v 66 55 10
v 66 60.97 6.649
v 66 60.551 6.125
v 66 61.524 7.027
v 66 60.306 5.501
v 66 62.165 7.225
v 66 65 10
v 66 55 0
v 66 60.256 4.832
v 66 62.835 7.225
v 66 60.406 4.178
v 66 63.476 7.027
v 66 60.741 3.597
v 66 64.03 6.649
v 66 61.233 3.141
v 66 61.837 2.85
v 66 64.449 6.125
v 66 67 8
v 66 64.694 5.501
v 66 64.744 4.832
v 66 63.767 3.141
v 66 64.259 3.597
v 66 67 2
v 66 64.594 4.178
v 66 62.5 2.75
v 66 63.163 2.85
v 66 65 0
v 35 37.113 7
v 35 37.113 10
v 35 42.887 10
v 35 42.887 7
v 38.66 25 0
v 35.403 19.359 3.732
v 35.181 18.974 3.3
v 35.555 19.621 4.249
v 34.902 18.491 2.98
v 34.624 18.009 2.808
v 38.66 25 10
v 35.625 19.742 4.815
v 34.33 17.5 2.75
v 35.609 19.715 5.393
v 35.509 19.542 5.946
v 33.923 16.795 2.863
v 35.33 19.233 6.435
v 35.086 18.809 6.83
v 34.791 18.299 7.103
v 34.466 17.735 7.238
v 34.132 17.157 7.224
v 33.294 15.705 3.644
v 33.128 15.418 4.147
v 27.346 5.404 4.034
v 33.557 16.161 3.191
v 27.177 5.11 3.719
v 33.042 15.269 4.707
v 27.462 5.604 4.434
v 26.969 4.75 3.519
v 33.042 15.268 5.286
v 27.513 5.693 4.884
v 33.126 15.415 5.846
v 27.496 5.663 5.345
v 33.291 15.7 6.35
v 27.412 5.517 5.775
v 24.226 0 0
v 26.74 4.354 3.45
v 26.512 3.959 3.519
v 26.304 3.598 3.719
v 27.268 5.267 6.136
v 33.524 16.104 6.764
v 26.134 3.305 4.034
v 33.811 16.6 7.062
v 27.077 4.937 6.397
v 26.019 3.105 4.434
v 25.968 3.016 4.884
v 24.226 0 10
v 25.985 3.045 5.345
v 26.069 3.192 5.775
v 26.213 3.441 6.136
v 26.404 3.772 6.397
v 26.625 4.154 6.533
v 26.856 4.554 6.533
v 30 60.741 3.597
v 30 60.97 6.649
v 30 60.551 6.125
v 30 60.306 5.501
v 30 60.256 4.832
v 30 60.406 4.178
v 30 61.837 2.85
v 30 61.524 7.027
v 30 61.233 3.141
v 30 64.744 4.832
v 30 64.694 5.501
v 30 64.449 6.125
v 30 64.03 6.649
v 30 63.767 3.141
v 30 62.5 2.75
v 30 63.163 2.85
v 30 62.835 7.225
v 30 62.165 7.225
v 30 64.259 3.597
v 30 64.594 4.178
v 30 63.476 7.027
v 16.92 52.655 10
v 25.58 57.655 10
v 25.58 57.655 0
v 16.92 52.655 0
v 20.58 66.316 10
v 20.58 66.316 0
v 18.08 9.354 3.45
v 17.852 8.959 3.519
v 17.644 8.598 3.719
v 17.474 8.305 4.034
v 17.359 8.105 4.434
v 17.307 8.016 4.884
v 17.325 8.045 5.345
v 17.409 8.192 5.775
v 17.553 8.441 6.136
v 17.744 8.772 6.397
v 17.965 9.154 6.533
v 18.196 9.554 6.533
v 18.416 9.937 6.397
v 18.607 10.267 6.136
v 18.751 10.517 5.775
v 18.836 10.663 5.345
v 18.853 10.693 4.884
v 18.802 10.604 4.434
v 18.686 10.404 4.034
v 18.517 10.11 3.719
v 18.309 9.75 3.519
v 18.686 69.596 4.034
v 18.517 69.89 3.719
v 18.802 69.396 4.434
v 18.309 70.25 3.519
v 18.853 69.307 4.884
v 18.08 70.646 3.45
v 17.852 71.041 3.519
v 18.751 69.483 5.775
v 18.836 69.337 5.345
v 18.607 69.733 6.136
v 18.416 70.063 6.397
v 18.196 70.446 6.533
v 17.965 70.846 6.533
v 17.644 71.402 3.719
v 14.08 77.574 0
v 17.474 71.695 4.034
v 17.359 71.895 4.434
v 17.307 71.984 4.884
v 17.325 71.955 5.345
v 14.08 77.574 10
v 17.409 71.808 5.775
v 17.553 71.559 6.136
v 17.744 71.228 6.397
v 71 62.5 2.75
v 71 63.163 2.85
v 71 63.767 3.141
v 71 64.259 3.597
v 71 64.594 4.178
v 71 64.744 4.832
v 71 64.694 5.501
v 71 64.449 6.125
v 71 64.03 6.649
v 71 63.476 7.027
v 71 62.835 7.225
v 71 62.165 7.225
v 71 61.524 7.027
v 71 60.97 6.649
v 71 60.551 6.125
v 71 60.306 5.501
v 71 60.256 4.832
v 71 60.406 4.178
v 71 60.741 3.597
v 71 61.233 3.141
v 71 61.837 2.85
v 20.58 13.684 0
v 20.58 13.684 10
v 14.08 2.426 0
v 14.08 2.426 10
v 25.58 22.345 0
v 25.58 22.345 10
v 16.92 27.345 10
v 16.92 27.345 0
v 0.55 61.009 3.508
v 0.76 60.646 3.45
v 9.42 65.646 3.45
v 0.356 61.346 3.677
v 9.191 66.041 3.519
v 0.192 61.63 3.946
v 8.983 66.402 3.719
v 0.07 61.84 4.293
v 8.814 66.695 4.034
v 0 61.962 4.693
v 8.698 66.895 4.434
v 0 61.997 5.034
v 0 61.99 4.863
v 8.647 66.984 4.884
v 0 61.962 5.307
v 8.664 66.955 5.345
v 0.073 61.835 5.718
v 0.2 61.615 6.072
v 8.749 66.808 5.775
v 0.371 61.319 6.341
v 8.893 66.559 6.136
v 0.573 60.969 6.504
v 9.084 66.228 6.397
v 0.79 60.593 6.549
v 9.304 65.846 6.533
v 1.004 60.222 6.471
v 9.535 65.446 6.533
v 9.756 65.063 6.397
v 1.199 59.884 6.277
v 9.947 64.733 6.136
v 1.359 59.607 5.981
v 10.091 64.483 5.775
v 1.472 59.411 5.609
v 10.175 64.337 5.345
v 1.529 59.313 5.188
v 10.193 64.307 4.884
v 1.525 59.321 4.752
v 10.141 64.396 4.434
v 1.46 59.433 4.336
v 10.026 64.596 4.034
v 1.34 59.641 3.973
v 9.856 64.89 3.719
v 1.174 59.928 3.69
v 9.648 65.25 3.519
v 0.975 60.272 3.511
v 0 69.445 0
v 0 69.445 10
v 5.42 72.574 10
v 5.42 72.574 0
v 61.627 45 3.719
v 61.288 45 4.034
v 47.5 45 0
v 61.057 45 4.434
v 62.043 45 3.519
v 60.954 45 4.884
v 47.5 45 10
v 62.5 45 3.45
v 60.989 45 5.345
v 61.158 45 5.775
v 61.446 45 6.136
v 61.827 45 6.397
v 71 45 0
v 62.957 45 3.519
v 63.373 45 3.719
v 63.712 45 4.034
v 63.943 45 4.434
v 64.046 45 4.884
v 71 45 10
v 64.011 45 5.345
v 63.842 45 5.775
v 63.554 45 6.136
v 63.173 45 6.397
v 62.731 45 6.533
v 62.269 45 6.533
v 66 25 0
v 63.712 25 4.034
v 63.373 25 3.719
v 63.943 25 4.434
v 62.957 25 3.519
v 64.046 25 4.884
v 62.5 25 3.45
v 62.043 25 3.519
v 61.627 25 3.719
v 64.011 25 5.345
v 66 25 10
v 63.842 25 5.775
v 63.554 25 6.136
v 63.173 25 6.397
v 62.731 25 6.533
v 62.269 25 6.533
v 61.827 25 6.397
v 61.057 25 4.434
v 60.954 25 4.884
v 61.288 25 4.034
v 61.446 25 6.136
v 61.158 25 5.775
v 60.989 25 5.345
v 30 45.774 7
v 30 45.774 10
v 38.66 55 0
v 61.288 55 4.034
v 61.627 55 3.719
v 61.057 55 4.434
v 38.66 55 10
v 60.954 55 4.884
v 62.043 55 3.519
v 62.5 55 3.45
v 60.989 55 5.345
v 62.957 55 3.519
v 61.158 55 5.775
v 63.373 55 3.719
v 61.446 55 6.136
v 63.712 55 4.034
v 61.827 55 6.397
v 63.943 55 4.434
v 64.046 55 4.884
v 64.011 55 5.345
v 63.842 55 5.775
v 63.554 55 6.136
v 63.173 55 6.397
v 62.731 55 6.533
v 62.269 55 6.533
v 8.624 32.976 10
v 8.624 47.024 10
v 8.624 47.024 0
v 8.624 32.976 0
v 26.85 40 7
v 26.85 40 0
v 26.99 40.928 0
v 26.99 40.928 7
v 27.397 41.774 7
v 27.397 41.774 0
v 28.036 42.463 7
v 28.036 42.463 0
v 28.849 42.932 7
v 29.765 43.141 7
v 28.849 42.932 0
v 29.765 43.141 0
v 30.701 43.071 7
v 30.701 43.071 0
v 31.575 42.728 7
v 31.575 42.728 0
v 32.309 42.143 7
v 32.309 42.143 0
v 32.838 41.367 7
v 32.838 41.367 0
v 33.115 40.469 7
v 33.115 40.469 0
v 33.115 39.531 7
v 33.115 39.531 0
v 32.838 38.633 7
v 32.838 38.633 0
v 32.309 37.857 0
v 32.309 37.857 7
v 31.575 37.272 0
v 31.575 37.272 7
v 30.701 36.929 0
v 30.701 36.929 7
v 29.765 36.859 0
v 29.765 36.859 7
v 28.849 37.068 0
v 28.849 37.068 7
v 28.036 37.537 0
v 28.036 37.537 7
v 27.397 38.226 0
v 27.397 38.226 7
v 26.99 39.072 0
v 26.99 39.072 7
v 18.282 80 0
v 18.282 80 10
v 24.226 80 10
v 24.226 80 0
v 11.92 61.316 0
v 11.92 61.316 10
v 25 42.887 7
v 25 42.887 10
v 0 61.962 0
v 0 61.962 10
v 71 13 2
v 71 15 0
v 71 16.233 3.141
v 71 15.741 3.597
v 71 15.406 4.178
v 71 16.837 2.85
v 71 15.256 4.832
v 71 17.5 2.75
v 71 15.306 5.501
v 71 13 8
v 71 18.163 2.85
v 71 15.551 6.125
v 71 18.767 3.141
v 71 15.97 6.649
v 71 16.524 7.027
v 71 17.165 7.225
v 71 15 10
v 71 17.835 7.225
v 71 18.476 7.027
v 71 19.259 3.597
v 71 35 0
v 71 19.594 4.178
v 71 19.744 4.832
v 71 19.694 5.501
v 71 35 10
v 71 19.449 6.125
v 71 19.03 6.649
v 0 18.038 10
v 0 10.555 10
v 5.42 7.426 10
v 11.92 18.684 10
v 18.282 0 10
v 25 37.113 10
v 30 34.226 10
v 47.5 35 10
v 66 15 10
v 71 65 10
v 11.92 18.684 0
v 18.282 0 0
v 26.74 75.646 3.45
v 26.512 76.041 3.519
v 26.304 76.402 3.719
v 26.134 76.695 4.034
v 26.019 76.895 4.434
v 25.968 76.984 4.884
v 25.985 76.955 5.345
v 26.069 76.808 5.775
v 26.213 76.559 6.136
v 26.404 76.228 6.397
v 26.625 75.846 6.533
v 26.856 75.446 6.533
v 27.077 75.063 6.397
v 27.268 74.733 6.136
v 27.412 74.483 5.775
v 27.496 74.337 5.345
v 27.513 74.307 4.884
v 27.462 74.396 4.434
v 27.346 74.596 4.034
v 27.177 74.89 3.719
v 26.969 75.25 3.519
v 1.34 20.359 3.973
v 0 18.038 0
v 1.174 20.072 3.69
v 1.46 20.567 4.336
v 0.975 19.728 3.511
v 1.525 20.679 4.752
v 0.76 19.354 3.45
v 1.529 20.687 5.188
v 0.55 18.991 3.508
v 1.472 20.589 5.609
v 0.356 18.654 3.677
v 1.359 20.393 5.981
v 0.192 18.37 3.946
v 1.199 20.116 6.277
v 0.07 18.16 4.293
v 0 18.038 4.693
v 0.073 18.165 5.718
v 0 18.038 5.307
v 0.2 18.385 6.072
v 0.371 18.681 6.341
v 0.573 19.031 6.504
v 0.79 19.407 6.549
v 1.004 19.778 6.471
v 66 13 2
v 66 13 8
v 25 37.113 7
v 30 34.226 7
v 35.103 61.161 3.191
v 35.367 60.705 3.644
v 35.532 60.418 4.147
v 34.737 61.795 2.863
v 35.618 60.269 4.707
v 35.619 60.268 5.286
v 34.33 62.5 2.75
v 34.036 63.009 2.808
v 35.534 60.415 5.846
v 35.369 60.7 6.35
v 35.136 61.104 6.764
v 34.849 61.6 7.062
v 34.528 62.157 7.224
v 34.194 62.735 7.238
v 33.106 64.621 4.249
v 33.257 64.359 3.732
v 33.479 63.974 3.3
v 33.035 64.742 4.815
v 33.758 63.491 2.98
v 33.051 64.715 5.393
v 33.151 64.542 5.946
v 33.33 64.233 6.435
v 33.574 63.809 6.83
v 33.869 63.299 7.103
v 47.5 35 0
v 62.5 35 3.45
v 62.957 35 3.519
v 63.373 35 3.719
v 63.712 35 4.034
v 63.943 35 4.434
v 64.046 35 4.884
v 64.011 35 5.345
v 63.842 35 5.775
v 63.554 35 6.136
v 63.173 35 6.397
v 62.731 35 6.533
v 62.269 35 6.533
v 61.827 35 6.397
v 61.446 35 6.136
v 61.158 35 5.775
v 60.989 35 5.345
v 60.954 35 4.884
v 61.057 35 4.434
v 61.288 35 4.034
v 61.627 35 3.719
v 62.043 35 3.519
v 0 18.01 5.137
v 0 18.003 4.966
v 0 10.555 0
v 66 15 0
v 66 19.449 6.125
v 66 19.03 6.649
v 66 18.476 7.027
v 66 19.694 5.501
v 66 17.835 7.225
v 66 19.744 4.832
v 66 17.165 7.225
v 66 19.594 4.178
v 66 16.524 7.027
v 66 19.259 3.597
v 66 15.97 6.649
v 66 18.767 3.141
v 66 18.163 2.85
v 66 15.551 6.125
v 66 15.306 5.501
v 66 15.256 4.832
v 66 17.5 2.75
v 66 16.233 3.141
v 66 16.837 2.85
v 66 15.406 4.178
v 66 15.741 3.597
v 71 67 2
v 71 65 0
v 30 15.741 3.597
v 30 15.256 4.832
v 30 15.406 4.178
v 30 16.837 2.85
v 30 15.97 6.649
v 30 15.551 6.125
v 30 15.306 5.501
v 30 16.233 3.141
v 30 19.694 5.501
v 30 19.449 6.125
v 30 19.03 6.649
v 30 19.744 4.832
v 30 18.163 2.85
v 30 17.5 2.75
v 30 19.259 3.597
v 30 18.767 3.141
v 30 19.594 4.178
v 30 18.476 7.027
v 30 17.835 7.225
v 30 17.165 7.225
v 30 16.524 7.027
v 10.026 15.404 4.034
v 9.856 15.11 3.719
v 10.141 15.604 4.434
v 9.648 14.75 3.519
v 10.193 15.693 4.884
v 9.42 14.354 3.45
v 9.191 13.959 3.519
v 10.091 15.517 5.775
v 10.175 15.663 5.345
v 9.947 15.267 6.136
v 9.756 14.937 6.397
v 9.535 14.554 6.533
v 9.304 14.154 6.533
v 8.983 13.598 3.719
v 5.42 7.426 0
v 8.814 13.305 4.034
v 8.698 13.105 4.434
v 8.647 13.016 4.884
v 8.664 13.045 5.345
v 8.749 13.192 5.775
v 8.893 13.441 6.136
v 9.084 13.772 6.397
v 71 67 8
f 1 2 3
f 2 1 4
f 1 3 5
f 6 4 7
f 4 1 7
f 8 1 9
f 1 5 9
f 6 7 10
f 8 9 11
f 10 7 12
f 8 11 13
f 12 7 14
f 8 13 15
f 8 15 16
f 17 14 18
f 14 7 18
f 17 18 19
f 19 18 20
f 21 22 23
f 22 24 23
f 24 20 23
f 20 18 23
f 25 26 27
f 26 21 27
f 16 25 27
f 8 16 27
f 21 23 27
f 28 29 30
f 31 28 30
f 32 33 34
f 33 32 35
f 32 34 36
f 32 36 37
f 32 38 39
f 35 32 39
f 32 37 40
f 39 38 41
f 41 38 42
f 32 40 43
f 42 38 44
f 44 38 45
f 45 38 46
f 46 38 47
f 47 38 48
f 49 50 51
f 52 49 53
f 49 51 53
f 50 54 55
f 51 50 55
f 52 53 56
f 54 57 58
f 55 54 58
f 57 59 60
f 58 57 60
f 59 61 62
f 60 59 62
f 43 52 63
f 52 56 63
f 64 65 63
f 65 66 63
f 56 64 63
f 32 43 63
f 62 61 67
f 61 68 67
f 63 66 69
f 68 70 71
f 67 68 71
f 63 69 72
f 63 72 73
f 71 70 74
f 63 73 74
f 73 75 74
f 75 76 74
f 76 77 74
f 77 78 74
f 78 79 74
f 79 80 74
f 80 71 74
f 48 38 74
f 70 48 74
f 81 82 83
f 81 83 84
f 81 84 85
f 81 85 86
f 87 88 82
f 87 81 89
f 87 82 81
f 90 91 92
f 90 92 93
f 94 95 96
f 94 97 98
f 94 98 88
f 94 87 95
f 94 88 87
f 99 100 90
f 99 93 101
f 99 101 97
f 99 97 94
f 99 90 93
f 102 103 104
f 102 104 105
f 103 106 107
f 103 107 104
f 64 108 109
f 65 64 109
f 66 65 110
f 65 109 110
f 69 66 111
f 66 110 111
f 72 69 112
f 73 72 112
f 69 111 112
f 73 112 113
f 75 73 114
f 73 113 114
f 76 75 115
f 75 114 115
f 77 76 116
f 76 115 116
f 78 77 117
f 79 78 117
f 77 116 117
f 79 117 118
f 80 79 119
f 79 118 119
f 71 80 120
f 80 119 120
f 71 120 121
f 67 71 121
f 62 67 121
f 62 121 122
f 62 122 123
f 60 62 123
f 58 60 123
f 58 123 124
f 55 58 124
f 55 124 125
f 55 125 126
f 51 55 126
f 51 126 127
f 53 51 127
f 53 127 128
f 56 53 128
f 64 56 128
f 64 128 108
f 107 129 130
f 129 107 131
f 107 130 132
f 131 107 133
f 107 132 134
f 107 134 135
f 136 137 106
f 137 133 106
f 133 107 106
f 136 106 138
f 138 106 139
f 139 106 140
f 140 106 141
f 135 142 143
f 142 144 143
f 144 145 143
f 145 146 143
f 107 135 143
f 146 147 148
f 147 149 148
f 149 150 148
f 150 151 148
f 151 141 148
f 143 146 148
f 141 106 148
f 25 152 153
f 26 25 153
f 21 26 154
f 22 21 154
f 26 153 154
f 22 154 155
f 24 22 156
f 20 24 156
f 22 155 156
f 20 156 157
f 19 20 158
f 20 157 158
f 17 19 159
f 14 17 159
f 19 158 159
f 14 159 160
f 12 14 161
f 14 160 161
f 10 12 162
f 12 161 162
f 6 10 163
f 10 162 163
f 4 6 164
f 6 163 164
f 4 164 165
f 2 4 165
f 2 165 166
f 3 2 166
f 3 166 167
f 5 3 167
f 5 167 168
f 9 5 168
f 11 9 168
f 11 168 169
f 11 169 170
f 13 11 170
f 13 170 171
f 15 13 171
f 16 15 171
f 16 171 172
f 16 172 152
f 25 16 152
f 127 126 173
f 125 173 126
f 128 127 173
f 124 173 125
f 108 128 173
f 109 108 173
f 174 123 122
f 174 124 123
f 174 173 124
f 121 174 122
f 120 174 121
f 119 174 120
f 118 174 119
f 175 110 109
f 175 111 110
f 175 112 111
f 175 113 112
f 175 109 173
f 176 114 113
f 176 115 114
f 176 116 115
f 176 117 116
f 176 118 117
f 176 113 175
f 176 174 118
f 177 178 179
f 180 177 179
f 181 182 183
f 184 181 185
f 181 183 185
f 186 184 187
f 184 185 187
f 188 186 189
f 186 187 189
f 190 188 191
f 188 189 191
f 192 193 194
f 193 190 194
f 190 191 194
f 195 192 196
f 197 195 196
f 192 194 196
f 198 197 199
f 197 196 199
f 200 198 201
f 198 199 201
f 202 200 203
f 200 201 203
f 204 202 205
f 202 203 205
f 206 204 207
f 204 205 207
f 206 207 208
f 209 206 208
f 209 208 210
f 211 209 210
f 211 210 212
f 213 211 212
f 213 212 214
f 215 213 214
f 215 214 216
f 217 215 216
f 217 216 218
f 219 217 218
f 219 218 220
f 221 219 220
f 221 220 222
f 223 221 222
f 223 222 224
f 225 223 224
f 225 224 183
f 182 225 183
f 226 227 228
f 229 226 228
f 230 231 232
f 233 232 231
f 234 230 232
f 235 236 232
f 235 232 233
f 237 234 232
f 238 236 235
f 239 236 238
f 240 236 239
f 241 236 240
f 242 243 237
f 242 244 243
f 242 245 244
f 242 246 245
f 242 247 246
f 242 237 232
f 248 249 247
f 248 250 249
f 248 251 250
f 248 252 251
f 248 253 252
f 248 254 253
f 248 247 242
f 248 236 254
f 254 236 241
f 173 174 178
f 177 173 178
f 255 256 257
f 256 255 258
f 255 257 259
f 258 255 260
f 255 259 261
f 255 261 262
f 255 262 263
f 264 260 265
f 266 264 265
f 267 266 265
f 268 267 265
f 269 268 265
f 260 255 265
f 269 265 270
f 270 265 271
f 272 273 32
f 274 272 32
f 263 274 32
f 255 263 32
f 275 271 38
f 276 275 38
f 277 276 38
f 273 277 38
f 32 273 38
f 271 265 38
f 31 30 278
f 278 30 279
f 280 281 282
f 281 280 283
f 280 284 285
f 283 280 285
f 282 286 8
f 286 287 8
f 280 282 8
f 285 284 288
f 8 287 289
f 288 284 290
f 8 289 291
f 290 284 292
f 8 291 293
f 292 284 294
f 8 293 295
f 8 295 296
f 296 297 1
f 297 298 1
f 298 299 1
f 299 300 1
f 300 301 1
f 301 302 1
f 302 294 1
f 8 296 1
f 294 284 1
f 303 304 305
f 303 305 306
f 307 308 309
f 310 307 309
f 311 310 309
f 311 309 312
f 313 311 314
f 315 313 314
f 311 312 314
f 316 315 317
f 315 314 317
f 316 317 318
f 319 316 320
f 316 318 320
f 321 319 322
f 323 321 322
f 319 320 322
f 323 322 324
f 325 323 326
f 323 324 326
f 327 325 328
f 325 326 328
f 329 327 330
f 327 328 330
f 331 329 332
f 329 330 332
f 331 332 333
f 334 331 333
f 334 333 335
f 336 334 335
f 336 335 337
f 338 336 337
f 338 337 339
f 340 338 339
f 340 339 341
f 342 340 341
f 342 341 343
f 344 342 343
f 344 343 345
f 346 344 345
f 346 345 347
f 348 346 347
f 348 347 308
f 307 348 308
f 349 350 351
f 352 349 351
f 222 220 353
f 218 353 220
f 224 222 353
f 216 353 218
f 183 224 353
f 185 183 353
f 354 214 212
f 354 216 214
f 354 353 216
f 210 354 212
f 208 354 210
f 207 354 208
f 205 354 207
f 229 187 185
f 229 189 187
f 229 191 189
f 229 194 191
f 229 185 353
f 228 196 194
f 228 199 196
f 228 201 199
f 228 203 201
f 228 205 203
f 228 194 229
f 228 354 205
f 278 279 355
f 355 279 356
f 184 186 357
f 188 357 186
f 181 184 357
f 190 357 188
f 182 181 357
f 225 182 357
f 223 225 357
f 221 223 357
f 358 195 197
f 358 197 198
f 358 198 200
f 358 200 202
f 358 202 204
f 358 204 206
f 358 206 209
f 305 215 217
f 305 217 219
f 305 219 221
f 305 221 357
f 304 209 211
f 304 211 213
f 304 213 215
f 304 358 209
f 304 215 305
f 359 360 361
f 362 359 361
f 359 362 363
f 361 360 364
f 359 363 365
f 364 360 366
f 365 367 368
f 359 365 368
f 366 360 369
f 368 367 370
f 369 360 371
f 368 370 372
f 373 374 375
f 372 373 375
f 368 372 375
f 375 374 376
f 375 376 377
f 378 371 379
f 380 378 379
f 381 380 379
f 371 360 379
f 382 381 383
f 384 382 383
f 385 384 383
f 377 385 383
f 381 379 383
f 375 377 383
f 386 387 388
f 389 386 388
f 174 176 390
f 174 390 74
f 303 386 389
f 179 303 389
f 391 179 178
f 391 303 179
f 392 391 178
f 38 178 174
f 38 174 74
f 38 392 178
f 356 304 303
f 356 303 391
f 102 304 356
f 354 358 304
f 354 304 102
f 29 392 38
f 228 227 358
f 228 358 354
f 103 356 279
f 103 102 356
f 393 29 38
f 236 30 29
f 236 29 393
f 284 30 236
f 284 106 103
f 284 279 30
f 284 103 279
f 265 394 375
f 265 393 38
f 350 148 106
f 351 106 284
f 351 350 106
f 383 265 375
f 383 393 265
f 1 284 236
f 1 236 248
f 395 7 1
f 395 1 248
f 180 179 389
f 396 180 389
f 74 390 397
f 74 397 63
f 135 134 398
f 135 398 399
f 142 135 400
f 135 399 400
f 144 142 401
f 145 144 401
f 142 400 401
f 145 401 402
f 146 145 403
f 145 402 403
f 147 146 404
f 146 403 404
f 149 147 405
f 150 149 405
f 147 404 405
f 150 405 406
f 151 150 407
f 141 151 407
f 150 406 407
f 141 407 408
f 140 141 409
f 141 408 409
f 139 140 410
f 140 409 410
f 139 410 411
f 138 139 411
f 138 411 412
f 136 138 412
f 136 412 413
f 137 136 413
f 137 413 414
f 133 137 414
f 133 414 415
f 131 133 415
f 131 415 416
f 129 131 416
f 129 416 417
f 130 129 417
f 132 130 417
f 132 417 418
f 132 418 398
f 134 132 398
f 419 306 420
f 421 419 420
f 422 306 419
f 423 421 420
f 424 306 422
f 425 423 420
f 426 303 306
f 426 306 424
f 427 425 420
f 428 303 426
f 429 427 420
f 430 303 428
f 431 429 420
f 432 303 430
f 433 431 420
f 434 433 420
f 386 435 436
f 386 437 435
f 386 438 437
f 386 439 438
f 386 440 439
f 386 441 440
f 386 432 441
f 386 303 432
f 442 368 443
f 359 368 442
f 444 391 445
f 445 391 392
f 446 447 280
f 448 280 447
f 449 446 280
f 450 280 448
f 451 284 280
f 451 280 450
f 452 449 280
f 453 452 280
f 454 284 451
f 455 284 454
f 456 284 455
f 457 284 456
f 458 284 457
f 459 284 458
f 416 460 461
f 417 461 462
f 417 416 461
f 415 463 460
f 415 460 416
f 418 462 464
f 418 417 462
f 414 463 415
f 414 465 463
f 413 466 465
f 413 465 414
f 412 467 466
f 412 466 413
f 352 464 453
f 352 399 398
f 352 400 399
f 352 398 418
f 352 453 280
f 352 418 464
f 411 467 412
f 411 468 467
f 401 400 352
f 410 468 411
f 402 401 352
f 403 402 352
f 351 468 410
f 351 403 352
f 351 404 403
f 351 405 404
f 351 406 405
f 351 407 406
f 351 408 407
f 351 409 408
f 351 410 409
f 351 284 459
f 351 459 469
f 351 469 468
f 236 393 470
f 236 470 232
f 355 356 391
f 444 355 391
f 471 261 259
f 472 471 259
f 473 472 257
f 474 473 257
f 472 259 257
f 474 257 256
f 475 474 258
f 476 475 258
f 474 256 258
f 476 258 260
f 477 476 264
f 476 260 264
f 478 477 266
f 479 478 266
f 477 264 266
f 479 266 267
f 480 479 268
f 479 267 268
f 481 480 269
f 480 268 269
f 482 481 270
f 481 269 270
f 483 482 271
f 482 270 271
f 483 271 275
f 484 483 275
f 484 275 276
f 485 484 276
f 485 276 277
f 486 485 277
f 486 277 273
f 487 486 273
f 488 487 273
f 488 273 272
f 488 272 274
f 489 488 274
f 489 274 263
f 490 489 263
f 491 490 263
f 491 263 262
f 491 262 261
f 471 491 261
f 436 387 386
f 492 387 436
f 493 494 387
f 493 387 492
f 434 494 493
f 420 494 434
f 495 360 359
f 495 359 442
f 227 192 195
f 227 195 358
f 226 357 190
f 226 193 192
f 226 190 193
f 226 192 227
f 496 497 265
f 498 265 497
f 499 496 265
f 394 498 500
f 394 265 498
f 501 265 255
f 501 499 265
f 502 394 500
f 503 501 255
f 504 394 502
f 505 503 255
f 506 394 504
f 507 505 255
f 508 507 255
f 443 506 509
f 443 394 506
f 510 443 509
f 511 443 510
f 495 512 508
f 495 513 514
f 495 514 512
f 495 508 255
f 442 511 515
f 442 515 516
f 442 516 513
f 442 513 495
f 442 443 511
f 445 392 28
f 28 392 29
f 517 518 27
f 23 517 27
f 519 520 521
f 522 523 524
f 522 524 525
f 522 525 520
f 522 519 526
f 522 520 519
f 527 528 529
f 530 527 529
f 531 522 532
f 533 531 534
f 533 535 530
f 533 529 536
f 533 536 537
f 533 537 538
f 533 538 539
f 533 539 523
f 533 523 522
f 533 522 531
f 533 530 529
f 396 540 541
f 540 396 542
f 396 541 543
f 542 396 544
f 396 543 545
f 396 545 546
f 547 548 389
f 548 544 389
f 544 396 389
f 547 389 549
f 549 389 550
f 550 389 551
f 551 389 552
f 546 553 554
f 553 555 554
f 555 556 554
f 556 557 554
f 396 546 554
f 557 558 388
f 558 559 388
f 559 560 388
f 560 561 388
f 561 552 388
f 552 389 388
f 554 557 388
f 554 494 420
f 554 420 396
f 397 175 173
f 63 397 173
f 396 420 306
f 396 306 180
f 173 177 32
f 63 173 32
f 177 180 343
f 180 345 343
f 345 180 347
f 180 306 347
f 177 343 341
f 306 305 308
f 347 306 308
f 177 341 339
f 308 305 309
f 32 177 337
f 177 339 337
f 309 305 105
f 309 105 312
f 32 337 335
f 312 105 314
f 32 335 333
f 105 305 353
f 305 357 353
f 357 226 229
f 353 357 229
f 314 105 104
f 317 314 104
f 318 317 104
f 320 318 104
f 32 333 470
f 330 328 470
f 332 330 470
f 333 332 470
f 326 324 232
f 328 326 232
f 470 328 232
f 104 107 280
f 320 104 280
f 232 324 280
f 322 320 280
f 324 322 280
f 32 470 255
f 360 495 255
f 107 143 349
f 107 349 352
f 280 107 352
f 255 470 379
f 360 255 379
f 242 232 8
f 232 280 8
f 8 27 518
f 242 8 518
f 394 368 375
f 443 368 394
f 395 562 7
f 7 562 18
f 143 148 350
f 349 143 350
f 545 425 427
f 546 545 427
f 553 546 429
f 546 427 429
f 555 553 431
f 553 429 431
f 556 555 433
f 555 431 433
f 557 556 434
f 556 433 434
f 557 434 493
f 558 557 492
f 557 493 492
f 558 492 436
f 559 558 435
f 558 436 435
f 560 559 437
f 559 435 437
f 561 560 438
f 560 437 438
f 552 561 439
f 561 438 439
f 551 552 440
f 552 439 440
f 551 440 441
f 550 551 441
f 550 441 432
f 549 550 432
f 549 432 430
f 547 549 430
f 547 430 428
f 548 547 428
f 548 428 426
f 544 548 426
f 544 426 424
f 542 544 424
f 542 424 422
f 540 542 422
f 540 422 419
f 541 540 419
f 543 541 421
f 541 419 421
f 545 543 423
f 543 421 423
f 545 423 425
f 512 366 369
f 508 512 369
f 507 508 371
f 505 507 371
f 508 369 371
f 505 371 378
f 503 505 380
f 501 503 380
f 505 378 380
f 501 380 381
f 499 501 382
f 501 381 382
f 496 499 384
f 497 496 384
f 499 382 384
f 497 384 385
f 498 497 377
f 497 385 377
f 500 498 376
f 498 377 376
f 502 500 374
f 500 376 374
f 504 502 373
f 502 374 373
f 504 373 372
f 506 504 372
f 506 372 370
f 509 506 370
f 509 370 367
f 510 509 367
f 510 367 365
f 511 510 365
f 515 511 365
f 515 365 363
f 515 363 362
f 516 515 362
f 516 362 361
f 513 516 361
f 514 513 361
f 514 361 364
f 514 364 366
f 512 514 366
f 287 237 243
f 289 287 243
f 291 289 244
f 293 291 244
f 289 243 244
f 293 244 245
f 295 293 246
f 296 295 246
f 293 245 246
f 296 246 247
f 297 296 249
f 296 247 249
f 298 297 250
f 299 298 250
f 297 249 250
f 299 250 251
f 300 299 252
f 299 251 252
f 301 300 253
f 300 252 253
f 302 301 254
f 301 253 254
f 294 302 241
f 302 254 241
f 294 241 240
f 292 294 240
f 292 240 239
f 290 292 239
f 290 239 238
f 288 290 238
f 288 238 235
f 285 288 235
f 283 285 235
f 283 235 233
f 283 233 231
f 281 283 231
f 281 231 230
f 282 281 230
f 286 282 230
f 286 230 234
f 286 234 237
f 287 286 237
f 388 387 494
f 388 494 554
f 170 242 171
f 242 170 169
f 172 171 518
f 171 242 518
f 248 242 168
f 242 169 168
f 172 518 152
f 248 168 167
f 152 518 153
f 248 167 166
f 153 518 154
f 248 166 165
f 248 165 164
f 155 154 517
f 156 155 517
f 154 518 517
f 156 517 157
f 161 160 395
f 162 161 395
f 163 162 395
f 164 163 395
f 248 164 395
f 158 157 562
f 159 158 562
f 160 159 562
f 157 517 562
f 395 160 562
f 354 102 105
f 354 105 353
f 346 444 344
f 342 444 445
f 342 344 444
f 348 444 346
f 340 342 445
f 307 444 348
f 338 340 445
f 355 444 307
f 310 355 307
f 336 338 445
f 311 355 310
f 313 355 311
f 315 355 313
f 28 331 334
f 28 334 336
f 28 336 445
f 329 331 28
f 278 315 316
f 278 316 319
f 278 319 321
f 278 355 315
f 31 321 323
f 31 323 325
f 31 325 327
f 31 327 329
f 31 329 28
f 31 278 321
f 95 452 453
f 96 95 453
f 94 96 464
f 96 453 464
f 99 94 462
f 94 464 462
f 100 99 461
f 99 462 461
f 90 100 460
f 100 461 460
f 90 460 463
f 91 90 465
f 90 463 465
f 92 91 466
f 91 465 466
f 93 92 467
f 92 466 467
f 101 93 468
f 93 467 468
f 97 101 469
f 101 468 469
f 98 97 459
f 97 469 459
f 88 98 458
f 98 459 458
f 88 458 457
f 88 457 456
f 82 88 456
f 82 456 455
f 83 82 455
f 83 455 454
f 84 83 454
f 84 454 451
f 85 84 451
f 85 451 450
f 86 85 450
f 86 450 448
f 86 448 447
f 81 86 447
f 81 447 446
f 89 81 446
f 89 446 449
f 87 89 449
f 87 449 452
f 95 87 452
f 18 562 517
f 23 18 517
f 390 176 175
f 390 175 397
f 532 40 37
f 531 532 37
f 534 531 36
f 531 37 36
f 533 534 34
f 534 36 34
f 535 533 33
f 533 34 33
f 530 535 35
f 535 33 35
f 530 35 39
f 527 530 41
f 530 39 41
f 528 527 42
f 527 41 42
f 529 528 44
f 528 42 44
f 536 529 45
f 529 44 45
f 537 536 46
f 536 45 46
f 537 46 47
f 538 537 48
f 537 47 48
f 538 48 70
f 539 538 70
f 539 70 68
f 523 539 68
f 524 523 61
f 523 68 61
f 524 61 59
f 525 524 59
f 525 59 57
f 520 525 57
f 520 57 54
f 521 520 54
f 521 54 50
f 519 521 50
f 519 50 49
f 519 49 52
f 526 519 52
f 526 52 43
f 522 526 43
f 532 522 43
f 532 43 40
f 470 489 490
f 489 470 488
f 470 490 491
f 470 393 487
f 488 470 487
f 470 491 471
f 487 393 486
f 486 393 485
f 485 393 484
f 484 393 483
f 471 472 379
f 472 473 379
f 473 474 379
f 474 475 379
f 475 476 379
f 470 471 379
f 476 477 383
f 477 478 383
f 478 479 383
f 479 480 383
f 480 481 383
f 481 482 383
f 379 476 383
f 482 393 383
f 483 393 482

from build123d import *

# Parameters (mm, degrees)
SKETCH1_W                = 71
SKETCH1_H                = 80
BOSS_EXTRUDE1_DEPTH      = 10
SKETCH3_W                = 10
SKETCH3_H                = 10
CUT_EXTRUDE1_DEPTH       = 10
SKETCH5_W                = 28.158683969
SKETCH5_H                = 10
CUT_EXTRUDE3_DEPTH       = 10
CIRPATTERN1_COUNT        = 3
M6_CLEARANCE_HOLE1_D     = 6.3
CUT_EXTRUDE6_DEPTH       = 3
SKETCH11_R               = 1.55
CUT_EXTRUDE7_DEPTH       = 108.429046352
CIRPATTERN2_COUNT        = 3
CUT_EXTRUDE8_DEPTH       = 10
CUT_EXTRUDE9_DEPTH       = 10
CUT_EXTRUDE10_DEPTH      = 10
SKETCH15_W               = 111
SKETCH15_H               = 42
BOSS_EXTRUDE2_DEPTH      = 10
SKETCH22_W               = 15
SKETCH22_H               = 54
BOSS_EXTRUDE3_DEPTH      = 10
M4_CLEARANCE_HOLE1_D     = 4.5
M4_CLEARANCE_HOLE1_DEPTH = 30
M4_CLEARANCE_HOLE1_TIP   = 1.351936393
SKETCH26_W               = 47.7
SKETCH26_H               = 6
CUT_EXTRUDE13_DEPTH      = 10
CHAMFER1_SIZE            = 4
CHAMFER1_SIZE_2          = 6.92820323
SKETCH27_W               = 6.3
SKETCH27_H               = 6
CUT_EXTRUDE14_DEPTH      = 10
CHAMFER2_SIZE            = 6.92820323
CHAMFER2_SIZE_2          = 4
CUT_EXTRUDE15_DEPTH      = 10
CUT_EXTRUDE16_DEPTH      = 2.2
CUT_EXTRUDE17_DEPTH      = 10
M4_CLEARANCE_HOLE2_D     = 4.5
SKETCH33_W               = 30
SKETCH33_H               = 90
CUT_EXTRUDE18_DEPTH      = 138.189649755
SKETCH34_W               = 10
SKETCH34_H               = 22
BOSS_EXTRUDE4_DEPTH      = 5
SKETCH38_R               = 2.25
CUT_EXTRUDE20_DEPTH      = 41
CHAMFER3_SIZE            = 2


with BuildPart() as part:
    # Sketch1 → Boss-Extrude1 (new body)
    with BuildSketch(Plane.XY):
        with Locations((35.5, 40)):
            Rectangle(SKETCH1_W, SKETCH1_H)
    extrude(amount=BOSS_EXTRUDE1_DEPTH)

    # Sketch3 → Cut-Extrude1 (cut)
    with BuildSketch(Plane.XY.offset(10)):
        Polygon((25.580127019, 57.655444566), (16.919872981, 52.655444566), (11.919872981, 61.315698604), (20.580127019, 66.315698604), align=None)
        Polygon((11.919872981, 18.684301396), (20.580127019, 13.684301396), (25.580127019, 22.344555434), (16.919872981, 27.344555434), align=None)
        with Locations((52.5, 40)):
            Rectangle(SKETCH3_W, SKETCH3_H)
    extrude(amount=-CUT_EXTRUDE1_DEPTH, mode=Mode.SUBTRACT)

    # Sketch5 → Cut-Extrude3 (cut)
    with BuildSketch(Plane.XY.offset(10)):
        with Locations((71.579341985, 40)):
            Rectangle(SKETCH5_W, SKETCH5_H)
    cut_extrude3 = extrude(amount=-CUT_EXTRUDE3_DEPTH, mode=Mode.SUBTRACT)

    # CirPattern1: Cut-Extrude3 ×3 about axis
    cirpattern1_axis = Axis((30, 40, 10), (0, 0, -1))
    for i in range(1, CIRPATTERN1_COUNT):
        add(cut_extrude3.rotate(cirpattern1_axis, i * 360 / CIRPATTERN1_COUNT), mode=Mode.SUBTRACT)

    # M6 Clearance Hole1 (through all)
    with Locations(Plane.XY.offset(10)):
        with Locations((30, 40)):
            Hole(M6_CLEARANCE_HOLE1_D / 2)

    # Sketch10 → Cut-Extrude6 (cut)
    with BuildSketch(Plane.XY.offset(10)):
        Polygon((30, 45.773502692), (25, 42.886751346), (25, 37.113248654), (30, 34.226497308), (35, 37.113248654), (35, 42.886751346), align=None)
    extrude(amount=-CUT_EXTRUDE6_DEPTH, mode=Mode.SUBTRACT)

    # Sketch11 → Cut-Extrude7 (cut, through all)
    with BuildSketch(Plane.XZ):
        with Locations(Location((62.5, 5, 0), (0, 0, 270))):
            Circle(SKETCH11_R)
    cut_extrude7 = extrude(amount=-CUT_EXTRUDE7_DEPTH, mode=Mode.SUBTRACT)

    # CirPattern2: Cut-Extrude7 ×3 about axis
    cirpattern2_axis = Axis((30, 40, 7), (0, 0, 1))
    for i in range(1, CIRPATTERN2_COUNT):
        add(cut_extrude7.rotate(cirpattern2_axis, i * 360 / CIRPATTERN2_COUNT), mode=Mode.SUBTRACT)

    # Sketch12 → Cut-Extrude8 (cut)
    with BuildSketch(Plane.XY.offset(10)):
        Polygon((71, 0), (71, 25), (38.660254038, 25), (24.226497308, 0), align=None)
    cut_extrude8 = extrude(amount=-CUT_EXTRUDE8_DEPTH, mode=Mode.SUBTRACT)

    # Mirror1: Cut-Extrude8 across plane
    add(cut_extrude8.mirror(Plane(origin=(0, 40, 0), x_dir=(0, 0, 1), z_dir=(0, -1, 0))), mode=Mode.SUBTRACT)

    # Sketch13 → Cut-Extrude9 (cut)
    with BuildSketch(Plane.XY.offset(10)):
        Polygon((0, 61.961524227), (8.624364028, 47.023687548), (8.624364028, 32.976312452), (0, 18.038475773), align=None)
    extrude(amount=-CUT_EXTRUDE9_DEPTH, mode=Mode.SUBTRACT)

    # Sketch14 → Cut-Extrude10 (cut)
    with BuildSketch(Plane.XY.offset(10)):
        Polygon((-3.240381057, 12.425971147), (22.740381057, -2.574028853), (18.169872981, -10.490381057), (-7.810889132, 4.509618943), align=None)
    cut_extrude10 = extrude(amount=-CUT_EXTRUDE10_DEPTH, mode=Mode.SUBTRACT)

    # Mirror2: Cut-Extrude10 across plane
    add(cut_extrude10.mirror(Plane(origin=(0, 40, 0), x_dir=(0, 0, 1), z_dir=(0, -1, 0))), mode=Mode.SUBTRACT)

    # Sketch15 → Boss-Extrude2 (add)
    with BuildSketch(Plane.XY.offset(10)):
        with Locations((126.5, 40)):
            Rectangle(SKETCH15_W, SKETCH15_H)
    extrude(amount=-BOSS_EXTRUDE2_DEPTH)

    # Sketch22 → Boss-Extrude3 (add)
    with BuildSketch(Plane.XY.offset(10)):
        with Locations((174.5, 40)):
            Rectangle(SKETCH22_W, SKETCH22_H)
    extrude(amount=-BOSS_EXTRUDE3_DEPTH)

    # M4 Clearance Hole1
    with Locations(Plane(origin=(182, 0, 0), x_dir=(0, 0, -1), z_dir=(1, 0, 0))):
        with Locations((-5, 62.5), (-5, 17.5)):
            Hole(M4_CLEARANCE_HOLE1_D / 2, depth=M4_CLEARANCE_HOLE1_DEPTH)
            with Locations((0, 0, -(M4_CLEARANCE_HOLE1_DEPTH + M4_CLEARANCE_HOLE1_TIP / 2))):  # 118° drill point
                Cone(0, M4_CLEARANCE_HOLE1_D / 2, M4_CLEARANCE_HOLE1_TIP, mode=Mode.SUBTRACT)

    # Sketch26 → Cut-Extrude13 (cut)
    with BuildSketch(Plane.XY.offset(10)):
        with Locations((143.15, 58)):
            Rectangle(SKETCH26_W, SKETCH26_H)
    cut_extrude13 = extrude(amount=-CUT_EXTRUDE13_DEPTH, mode=Mode.SUBTRACT)

    # Mirror3: Cut-Extrude13 across plane
    add(cut_extrude13.mirror(Plane(origin=(0, 40, 0), x_dir=(0, 0, 1), z_dir=(0, -1, 0))), mode=Mode.SUBTRACT)

    # Chamfer1
    # the kernel refuses this chamfer: 6.92820323, 4 mm, written as the material it adds along each edge
    with BuildSketch(Plane(origin=(119.3, 25, 10), x_dir=(0.9983227437537926, 0.05789386240267157, 0), z_dir=(0, 0, -1))) as chamfer1_piece_1_section:
        Polygon((CHAMFER1_SIZE * 0.998322743754, CHAMFER1_SIZE * 0.0578938624027), (-CHAMFER1_SIZE_2 * 0.057893862405, CHAMFER1_SIZE_2 * 0.998322743793), (0, 0), align=None)
    chamfer1_piece_1 = extrude(amount=10, mode=Mode.PRIVATE)
    chamfer1_piece_1 = split(chamfer1_piece_1, bisect_by=Plane(origin=(120.625811149, 19, 5), z_dir=(0, 1, 0)), keep=Keep.TOP, mode=Mode.PRIVATE)
    add(chamfer1_piece_1)
    with BuildSketch(Plane(origin=(119.3, 55, 10), x_dir=(-0.019326765612697788, 0.999813220622208, 0), z_dir=(0, 0, -1))) as chamfer1_piece_2_section:
        Polygon((CHAMFER1_SIZE_2 * 0.999813220662, CHAMFER1_SIZE_2 * 0.0193267656135), (-CHAMFER1_SIZE * 0.0193267656127, CHAMFER1_SIZE * 0.999813220622), (0, 0), align=None)
    chamfer1_piece_2 = extrude(amount=10, mode=Mode.PRIVATE)
    chamfer1_piece_2 = split(chamfer1_piece_2, bisect_by=Plane(origin=(120.625811149, 61, 5), z_dir=(0, -1, 0)), keep=Keep.TOP, mode=Mode.PRIVATE)
    add(chamfer1_piece_2)

    # Sketch27 → Cut-Extrude14 (cut)
    with BuildSketch(Plane.XY.offset(10)):
        with Locations((74.15, 58)):
            Rectangle(SKETCH27_W, SKETCH27_H)
    cut_extrude14 = extrude(amount=-CUT_EXTRUDE14_DEPTH, mode=Mode.SUBTRACT)

    # Mirror4: Cut-Extrude14 across plane
    add(cut_extrude14.mirror(Plane(origin=(0, 40, 0), x_dir=(0, 0, 1), z_dir=(0, -1, 0))), mode=Mode.SUBTRACT)

    # Chamfer2
    # the kernel refuses this chamfer: 6.92820323, 4 mm, written as the material it adds along each edge
    with BuildSketch(Plane(origin=(77.3, 55, 10), x_dir=(0.019326765612699692, 0.9998132206222079, 0), z_dir=(0, 0, -1))) as chamfer2_piece_1_section:
        Polygon((CHAMFER2_SIZE * 0.999813220662, -CHAMFER2_SIZE * 0.0193267656135), (-CHAMFER2_SIZE_2 * 0.0193267656127, -CHAMFER2_SIZE_2 * 0.999813220622), (0, 0), align=None)
    chamfer2_piece_1 = extrude(amount=10, mode=Mode.PRIVATE)
    chamfer2_piece_1 = split(chamfer2_piece_1, bisect_by=Plane(origin=(75.974188851, 61, 5), z_dir=(0, -1, 0)), keep=Keep.TOP, mode=Mode.PRIVATE)
    add(chamfer2_piece_1)
    with BuildSketch(Plane(origin=(77.3, 25, 10), x_dir=(-0.9983227437537929, 0.05789386240266474, 0), z_dir=(0, 0, -1))) as chamfer2_piece_2_section:
        Polygon((CHAMFER2_SIZE_2 * 0.998322743754, -CHAMFER2_SIZE_2 * 0.0578938624027), (-CHAMFER2_SIZE * 0.057893862405, -CHAMFER2_SIZE * 0.998322743793), (0, 0), align=None)
    chamfer2_piece_2 = extrude(amount=10, mode=Mode.PRIVATE)
    chamfer2_piece_2 = split(chamfer2_piece_2, bisect_by=Plane(origin=(75.974188851, 19, 5), z_dir=(0, 1, 0)), keep=Keep.TOP, mode=Mode.PRIVATE)
    add(chamfer2_piece_2)

    # Sketch21 → Cut-Extrude15 (cut)
    with BuildSketch(Plane.XY.offset(10)):
        with BuildLine():
            Line((97.55, 47.5), (99.05, 47.5))
            ThreePointArc((99.05, 47.5), (106.55, 40), (99.05, 32.5))
            Line((99.05, 32.5), (97.55, 32.5))
            ThreePointArc((97.55, 32.5), (90.05, 40), (97.55, 47.5))
        make_face()
    extrude(amount=-CUT_EXTRUDE15_DEPTH, mode=Mode.SUBTRACT)

    # Sketch28 → Cut-Extrude16 (cut)
    with BuildSketch(Plane.XY.offset(10)):
        with BuildLine():
            Line((97.55, 51.25), (99.05, 51.25))
            ThreePointArc((99.05, 51.25), (110.3, 40), (99.05, 28.75))
            Line((99.05, 28.75), (97.55, 28.75))
            ThreePointArc((97.55, 28.75), (86.3, 40), (97.55, 51.25))
        make_face()
    extrude(amount=-CUT_EXTRUDE16_DEPTH, mode=Mode.SUBTRACT)

    # Sketch29 → Cut-Extrude17 (cut)
    with BuildSketch(Plane.XY.offset(10)):
        with BuildLine():
            Line((82.05, 57.2), (83.55, 57.2))
            ThreePointArc((83.55, 57.2), (85.25, 55.5), (83.55, 53.8))
            Line((83.55, 53.8), (82.05, 53.8))
            ThreePointArc((82.05, 53.8), (80.35, 55.5), (82.05, 57.2))
        make_face()
        with BuildLine():
            Line((113.05, 53.8), (114.55, 53.8))
            ThreePointArc((114.55, 53.8), (116.25, 55.5), (114.55, 57.2))
            Line((114.55, 57.2), (113.05, 57.2))
            ThreePointArc((113.05, 57.2), (111.35, 55.5), (113.05, 53.8))
        make_face()
        with BuildLine():
            Line((113.05, 22.8), (114.55, 22.8))
            ThreePointArc((114.55, 22.8), (116.25, 24.5), (114.55, 26.2))
            Line((114.55, 26.2), (113.05, 26.2))
            ThreePointArc((113.05, 26.2), (111.35, 24.5), (113.05, 22.8))
        make_face()
        with BuildLine():
            Line((82.05, 22.8), (83.55, 22.8))
            ThreePointArc((83.55, 22.8), (85.25, 24.5), (83.55, 26.2))
            Line((83.55, 26.2), (82.05, 26.2))
            ThreePointArc((82.05, 26.2), (80.35, 24.5), (82.05, 22.8))
        make_face()
    extrude(amount=-CUT_EXTRUDE17_DEPTH, mode=Mode.SUBTRACT)

    # M4 Clearance Hole2 (through all)
    with Locations(Plane.XY.offset(10)):
        with Locations((134, 50.5), (155, 50.5), (155, 29.5), (134, 29.5)):
            Hole(M4_CLEARANCE_HOLE2_D / 2)

    # Sketch33 → Cut-Extrude18 (cut, through all)
    with BuildSketch(Plane.ZY.offset(-71)):
        with Locations((5, 40)):
            Rectangle(SKETCH33_W, SKETCH33_H)
    extrude(amount=-CUT_EXTRUDE18_DEPTH, mode=Mode.SUBTRACT)

    # Sketch34 → Boss-Extrude4 (add)
    with BuildSketch(Plane(origin=(71, 0, 0), x_dir=(0, 0, -1), z_dir=(1, 0, 0))):
        with Locations((-5, 56)):
            Rectangle(SKETCH34_W, SKETCH34_H)
    boss_extrude4 = extrude(amount=-BOSS_EXTRUDE4_DEPTH)

    # Mirror5: Boss-Extrude4 across plane
    add(boss_extrude4.mirror(Plane(origin=(0, 40, 0), x_dir=(0, 0, 1), z_dir=(0, -1, 0))))

    # Sketch38 → Cut-Extrude20 (cut)
    with BuildSketch(Plane(origin=(71, 0, 0), x_dir=(0, 0, -1), z_dir=(1, 0, 0))):
        with Locations((-5, 62.5)):
            Circle(SKETCH38_R)
        with Locations((-5, 17.5)):
            Circle(SKETCH38_R)
    extrude(amount=-CUT_EXTRUDE20_DEPTH, mode=Mode.SUBTRACT)

    # Chamfer3
    chamfer3_edges = [part.edges().sort_by_distance(p)[0] for p in [
        (68.5, 67, 10),
        (68.5, 67, 0),
        (68.5, 13, 10),
        (68.5, 13, 0),
    ]]
    chamfer(chamfer3_edges, length=CHAMFER3_SIZE)


solid = part.part
